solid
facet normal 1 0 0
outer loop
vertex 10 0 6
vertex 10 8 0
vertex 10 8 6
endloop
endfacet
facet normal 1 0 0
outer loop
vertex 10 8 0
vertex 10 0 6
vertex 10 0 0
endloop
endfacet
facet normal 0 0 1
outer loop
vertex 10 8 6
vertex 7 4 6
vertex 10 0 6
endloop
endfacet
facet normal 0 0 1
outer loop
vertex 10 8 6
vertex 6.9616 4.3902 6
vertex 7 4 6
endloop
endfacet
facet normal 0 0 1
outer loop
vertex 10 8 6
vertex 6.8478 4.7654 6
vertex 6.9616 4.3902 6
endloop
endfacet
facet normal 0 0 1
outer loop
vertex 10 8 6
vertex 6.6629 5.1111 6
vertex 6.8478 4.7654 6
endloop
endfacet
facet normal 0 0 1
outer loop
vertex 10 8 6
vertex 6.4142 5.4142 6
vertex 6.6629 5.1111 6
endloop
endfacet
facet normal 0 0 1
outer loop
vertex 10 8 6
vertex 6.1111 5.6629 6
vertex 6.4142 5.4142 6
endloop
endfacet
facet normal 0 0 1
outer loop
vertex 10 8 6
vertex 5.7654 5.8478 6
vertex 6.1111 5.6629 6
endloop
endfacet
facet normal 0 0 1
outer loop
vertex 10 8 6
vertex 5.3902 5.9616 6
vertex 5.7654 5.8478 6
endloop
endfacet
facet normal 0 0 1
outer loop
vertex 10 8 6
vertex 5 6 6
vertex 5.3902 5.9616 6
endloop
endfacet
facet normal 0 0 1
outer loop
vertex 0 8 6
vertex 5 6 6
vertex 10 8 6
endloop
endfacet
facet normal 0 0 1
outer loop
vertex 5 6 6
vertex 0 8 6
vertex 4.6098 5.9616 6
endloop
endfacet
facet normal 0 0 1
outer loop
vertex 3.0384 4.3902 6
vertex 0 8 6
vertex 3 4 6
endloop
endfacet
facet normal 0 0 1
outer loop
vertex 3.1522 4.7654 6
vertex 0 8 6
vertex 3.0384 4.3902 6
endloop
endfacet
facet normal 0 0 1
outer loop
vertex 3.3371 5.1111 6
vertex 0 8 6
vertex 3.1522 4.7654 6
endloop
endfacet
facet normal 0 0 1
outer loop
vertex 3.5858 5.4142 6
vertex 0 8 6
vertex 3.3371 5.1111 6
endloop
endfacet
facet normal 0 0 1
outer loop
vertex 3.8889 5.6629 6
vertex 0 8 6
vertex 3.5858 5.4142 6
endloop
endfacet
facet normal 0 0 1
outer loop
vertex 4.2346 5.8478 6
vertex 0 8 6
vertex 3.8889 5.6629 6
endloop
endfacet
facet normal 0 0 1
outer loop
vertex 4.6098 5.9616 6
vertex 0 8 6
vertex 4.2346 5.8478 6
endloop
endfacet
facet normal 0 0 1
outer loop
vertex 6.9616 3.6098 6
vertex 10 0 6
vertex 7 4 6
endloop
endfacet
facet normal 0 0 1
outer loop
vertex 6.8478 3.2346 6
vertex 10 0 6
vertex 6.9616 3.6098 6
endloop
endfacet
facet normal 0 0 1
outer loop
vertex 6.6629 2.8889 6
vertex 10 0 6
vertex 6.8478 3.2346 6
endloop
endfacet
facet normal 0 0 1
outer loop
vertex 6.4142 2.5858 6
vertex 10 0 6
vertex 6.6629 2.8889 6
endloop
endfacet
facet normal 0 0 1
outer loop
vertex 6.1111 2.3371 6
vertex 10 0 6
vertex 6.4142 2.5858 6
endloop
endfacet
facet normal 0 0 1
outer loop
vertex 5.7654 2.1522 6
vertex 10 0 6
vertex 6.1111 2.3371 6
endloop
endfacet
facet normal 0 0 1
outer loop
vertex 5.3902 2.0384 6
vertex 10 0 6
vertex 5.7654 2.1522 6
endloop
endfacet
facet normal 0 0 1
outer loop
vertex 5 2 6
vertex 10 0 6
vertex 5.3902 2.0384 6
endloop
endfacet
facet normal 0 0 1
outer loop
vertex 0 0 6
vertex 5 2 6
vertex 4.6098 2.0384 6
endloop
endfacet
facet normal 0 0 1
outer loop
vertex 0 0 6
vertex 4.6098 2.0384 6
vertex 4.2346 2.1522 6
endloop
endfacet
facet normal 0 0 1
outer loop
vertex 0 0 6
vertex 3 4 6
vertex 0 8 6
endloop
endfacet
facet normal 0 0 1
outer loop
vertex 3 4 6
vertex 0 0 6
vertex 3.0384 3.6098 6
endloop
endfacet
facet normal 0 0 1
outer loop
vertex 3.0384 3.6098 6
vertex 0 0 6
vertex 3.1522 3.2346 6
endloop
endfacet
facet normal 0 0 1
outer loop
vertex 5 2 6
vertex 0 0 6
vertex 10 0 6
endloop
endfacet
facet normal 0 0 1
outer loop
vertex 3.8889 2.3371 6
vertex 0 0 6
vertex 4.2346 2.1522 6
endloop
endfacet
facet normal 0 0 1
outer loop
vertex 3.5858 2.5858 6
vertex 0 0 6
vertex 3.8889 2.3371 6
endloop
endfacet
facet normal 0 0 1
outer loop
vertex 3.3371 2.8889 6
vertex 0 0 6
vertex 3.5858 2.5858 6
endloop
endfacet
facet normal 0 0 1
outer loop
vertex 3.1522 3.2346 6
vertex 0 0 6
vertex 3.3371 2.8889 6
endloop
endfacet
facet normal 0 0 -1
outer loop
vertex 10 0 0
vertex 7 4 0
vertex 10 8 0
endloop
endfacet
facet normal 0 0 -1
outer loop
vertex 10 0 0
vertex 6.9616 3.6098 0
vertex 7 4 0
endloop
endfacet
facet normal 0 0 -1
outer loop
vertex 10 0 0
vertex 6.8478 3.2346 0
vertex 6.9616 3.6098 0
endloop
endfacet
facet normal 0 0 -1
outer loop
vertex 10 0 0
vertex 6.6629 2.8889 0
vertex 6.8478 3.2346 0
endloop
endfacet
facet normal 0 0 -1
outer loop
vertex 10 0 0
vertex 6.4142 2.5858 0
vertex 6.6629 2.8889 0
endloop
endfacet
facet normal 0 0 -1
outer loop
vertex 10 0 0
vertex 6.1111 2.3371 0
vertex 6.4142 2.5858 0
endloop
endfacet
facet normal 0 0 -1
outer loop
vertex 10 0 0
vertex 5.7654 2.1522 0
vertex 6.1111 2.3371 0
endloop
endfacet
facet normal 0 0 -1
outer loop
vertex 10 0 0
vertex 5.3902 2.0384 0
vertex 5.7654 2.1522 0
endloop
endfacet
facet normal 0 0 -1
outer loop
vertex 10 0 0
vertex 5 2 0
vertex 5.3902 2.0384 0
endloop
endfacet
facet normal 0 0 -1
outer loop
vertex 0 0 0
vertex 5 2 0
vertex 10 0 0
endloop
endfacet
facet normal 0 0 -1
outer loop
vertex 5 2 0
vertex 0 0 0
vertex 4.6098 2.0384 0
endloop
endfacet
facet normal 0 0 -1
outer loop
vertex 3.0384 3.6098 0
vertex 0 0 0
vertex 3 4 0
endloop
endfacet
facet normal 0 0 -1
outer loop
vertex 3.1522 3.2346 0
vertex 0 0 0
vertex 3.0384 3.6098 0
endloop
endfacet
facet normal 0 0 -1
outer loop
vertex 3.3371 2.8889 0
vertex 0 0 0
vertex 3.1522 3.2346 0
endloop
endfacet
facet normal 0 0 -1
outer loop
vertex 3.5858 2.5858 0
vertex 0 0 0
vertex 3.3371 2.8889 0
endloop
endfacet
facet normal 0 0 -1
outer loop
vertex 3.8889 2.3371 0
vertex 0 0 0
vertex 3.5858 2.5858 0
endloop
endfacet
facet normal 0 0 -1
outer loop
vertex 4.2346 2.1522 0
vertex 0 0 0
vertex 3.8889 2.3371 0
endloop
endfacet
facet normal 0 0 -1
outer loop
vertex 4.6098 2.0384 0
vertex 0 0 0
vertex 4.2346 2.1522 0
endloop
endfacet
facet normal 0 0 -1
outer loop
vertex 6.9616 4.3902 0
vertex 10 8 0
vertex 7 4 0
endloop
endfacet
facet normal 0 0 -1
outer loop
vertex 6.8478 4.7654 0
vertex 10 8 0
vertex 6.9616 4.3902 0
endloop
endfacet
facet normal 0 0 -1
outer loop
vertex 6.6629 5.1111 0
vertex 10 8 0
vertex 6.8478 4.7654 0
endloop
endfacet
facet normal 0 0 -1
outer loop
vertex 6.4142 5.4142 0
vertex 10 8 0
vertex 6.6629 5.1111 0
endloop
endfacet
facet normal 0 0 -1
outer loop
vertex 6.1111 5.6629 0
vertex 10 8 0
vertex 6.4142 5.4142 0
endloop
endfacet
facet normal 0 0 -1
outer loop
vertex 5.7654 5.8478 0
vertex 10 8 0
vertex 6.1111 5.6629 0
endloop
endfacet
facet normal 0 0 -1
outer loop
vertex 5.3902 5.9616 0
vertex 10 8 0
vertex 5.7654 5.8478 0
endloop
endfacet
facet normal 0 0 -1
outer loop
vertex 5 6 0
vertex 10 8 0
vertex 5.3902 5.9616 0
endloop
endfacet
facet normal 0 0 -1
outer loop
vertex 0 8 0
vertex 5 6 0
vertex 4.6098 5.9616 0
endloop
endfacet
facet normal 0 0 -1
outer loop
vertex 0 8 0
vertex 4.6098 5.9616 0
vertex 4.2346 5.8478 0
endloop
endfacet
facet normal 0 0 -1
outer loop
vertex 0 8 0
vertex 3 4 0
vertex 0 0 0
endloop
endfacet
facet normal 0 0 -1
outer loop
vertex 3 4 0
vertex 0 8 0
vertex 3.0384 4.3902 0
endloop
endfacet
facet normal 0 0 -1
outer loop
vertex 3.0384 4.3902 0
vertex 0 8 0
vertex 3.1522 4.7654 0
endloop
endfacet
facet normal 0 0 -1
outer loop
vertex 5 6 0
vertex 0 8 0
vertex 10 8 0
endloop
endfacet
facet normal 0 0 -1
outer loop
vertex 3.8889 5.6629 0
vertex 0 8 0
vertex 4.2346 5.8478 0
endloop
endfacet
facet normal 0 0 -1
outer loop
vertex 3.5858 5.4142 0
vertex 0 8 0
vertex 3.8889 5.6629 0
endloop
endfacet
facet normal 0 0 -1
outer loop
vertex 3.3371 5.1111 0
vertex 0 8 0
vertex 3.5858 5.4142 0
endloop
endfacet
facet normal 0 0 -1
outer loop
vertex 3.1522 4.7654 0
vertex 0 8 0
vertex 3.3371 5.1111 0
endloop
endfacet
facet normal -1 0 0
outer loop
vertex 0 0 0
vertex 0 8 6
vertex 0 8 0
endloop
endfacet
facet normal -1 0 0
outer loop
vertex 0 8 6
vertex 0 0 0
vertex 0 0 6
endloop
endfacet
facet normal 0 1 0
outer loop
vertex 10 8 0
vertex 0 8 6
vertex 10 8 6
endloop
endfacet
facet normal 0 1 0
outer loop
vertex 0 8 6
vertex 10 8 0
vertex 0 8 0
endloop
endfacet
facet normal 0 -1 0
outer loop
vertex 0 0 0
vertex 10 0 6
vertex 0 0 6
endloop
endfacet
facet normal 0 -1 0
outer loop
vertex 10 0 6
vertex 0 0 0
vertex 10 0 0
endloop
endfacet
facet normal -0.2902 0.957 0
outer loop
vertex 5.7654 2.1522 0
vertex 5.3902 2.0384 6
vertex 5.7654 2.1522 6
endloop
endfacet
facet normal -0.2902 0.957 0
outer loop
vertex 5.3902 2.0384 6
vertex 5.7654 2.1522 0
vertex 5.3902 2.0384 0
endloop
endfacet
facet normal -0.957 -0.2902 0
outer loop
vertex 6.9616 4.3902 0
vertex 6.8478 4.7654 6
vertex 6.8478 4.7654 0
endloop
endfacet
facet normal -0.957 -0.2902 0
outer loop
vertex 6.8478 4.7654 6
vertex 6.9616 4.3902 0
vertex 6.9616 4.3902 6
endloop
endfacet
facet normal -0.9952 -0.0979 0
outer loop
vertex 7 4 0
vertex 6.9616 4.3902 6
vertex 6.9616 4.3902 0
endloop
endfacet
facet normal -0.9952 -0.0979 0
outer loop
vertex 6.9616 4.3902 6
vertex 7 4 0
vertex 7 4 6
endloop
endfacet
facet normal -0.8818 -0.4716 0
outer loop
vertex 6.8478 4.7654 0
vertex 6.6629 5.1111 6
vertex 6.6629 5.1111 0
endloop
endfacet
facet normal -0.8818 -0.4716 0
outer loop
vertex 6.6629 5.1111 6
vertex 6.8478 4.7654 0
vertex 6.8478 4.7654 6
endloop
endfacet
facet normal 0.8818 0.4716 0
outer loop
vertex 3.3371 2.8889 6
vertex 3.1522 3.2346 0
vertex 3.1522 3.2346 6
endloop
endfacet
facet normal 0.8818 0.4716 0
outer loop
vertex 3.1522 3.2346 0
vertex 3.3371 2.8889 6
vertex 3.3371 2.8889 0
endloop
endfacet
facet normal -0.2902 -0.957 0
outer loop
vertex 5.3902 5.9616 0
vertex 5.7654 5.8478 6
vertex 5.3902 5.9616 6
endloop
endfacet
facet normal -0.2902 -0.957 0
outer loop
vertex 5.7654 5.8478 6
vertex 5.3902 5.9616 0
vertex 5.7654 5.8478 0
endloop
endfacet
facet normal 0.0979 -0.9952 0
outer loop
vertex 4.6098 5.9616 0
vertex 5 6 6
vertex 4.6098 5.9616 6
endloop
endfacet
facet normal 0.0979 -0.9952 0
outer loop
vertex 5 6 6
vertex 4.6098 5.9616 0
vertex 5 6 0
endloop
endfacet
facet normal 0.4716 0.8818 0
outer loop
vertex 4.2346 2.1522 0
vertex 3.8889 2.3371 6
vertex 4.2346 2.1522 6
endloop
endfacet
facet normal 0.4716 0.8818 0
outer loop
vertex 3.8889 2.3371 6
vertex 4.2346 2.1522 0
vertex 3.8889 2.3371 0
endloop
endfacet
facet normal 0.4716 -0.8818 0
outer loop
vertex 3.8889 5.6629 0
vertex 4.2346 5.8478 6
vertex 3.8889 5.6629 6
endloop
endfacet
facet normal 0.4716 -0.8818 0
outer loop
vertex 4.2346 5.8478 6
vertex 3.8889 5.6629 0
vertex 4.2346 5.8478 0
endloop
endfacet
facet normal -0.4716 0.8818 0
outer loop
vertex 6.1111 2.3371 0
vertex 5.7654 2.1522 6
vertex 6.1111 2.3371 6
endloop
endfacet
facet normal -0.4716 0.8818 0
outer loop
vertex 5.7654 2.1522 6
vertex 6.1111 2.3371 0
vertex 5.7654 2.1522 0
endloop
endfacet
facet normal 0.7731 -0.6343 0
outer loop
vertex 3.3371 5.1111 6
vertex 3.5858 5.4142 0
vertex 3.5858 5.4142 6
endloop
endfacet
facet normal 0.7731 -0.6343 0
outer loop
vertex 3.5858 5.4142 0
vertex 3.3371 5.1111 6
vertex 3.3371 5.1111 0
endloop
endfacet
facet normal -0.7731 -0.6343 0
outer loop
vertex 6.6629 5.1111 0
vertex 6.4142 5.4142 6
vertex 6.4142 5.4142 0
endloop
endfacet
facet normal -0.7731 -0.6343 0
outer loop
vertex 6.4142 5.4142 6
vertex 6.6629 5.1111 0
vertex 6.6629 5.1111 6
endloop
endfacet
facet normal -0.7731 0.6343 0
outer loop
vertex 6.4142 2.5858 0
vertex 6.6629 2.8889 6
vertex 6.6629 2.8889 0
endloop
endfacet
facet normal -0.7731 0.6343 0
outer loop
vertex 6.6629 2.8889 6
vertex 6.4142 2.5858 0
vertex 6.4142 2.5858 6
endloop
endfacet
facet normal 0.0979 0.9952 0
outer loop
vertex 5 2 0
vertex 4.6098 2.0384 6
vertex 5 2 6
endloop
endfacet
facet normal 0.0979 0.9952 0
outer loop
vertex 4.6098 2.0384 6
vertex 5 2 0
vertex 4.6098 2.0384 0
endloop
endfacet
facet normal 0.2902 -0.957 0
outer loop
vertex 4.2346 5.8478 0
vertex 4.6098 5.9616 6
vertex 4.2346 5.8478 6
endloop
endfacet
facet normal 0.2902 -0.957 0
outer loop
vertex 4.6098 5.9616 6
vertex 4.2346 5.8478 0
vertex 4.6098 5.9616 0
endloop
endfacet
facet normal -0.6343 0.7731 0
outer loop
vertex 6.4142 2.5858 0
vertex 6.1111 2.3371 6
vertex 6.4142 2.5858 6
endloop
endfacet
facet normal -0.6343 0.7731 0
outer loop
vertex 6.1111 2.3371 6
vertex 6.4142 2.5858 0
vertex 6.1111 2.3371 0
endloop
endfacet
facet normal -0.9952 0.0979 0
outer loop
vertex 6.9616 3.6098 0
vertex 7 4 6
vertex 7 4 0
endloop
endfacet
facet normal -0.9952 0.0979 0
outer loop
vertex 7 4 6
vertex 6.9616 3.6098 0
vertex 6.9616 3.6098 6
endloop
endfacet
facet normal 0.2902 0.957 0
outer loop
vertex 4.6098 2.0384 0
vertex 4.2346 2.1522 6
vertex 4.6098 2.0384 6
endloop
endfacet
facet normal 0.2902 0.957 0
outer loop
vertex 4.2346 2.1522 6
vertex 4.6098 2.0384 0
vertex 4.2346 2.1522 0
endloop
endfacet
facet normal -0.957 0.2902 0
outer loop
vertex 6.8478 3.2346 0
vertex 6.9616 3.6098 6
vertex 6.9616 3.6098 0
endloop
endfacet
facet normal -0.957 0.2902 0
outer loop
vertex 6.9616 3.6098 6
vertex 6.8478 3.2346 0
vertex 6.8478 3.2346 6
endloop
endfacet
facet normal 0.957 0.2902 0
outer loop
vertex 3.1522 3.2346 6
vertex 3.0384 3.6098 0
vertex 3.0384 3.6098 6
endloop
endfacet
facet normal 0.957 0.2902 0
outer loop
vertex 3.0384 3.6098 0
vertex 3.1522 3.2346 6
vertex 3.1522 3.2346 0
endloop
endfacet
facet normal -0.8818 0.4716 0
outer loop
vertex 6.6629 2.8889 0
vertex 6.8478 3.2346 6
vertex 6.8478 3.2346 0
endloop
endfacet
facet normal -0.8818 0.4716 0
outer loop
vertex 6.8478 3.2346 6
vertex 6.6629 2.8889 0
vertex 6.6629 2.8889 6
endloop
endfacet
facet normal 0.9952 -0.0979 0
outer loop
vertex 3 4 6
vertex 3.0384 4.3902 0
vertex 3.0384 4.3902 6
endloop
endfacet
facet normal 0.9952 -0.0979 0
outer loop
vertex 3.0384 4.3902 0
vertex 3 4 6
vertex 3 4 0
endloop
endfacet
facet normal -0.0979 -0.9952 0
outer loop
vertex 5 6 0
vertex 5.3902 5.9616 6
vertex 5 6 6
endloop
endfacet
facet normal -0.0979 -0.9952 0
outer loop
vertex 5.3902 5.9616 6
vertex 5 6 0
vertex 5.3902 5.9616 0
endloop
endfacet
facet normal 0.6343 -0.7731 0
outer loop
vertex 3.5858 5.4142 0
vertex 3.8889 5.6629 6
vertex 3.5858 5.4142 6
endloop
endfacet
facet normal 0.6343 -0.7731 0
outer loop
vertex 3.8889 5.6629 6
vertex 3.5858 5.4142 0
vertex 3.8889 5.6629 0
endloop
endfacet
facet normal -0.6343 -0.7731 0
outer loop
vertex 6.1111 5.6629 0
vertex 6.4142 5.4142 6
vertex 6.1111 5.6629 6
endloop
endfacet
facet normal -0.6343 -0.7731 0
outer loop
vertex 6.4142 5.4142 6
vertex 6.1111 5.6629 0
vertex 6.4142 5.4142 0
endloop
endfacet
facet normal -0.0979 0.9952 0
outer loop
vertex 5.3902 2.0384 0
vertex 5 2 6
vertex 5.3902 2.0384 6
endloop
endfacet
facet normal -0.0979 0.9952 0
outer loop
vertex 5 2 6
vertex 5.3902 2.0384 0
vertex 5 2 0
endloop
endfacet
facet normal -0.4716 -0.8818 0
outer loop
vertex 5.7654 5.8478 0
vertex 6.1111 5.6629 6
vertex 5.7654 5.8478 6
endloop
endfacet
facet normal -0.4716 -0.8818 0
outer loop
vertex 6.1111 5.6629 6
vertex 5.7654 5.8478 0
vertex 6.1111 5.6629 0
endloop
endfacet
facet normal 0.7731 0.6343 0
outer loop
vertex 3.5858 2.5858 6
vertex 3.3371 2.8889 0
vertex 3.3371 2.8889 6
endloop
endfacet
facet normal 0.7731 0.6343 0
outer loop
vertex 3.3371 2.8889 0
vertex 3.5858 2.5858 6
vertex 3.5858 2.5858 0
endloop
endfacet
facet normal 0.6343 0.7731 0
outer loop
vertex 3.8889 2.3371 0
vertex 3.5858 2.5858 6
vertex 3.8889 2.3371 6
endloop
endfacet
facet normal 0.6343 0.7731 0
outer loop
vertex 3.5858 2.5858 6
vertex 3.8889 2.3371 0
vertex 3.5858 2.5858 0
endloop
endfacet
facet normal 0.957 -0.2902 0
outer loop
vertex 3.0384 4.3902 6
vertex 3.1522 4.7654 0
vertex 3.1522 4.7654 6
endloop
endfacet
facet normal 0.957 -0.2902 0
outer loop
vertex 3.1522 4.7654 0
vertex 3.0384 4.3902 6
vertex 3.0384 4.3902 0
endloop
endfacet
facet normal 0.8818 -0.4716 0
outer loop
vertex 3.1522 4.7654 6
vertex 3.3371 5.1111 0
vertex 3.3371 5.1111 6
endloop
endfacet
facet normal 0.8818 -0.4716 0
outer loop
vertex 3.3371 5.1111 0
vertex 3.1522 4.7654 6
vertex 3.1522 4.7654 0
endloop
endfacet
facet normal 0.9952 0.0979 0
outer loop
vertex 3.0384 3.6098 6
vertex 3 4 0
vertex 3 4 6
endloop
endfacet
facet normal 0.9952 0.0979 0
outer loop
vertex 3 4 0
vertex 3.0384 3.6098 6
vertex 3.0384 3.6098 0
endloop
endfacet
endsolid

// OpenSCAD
$fn = 32;

// ----------------------------------------------------------------------
// Micro pad: drilled pad, 5-20 mm class
// ----------------------------------------------------------------------

// --- parameters (mm) ---
pad_l = 10;               // pad length, X
pad_w = 8;                // pad width, Y
pad_t = 6;                // pad thickness, Z
hole_d = 4;               // through hole diameter

difference() {
  cube([pad_l, pad_w, pad_t]);
  translate([pad_l / 2, pad_w / 2, -1])
    cylinder(h = pad_t + 2, d = hole_d);
}
